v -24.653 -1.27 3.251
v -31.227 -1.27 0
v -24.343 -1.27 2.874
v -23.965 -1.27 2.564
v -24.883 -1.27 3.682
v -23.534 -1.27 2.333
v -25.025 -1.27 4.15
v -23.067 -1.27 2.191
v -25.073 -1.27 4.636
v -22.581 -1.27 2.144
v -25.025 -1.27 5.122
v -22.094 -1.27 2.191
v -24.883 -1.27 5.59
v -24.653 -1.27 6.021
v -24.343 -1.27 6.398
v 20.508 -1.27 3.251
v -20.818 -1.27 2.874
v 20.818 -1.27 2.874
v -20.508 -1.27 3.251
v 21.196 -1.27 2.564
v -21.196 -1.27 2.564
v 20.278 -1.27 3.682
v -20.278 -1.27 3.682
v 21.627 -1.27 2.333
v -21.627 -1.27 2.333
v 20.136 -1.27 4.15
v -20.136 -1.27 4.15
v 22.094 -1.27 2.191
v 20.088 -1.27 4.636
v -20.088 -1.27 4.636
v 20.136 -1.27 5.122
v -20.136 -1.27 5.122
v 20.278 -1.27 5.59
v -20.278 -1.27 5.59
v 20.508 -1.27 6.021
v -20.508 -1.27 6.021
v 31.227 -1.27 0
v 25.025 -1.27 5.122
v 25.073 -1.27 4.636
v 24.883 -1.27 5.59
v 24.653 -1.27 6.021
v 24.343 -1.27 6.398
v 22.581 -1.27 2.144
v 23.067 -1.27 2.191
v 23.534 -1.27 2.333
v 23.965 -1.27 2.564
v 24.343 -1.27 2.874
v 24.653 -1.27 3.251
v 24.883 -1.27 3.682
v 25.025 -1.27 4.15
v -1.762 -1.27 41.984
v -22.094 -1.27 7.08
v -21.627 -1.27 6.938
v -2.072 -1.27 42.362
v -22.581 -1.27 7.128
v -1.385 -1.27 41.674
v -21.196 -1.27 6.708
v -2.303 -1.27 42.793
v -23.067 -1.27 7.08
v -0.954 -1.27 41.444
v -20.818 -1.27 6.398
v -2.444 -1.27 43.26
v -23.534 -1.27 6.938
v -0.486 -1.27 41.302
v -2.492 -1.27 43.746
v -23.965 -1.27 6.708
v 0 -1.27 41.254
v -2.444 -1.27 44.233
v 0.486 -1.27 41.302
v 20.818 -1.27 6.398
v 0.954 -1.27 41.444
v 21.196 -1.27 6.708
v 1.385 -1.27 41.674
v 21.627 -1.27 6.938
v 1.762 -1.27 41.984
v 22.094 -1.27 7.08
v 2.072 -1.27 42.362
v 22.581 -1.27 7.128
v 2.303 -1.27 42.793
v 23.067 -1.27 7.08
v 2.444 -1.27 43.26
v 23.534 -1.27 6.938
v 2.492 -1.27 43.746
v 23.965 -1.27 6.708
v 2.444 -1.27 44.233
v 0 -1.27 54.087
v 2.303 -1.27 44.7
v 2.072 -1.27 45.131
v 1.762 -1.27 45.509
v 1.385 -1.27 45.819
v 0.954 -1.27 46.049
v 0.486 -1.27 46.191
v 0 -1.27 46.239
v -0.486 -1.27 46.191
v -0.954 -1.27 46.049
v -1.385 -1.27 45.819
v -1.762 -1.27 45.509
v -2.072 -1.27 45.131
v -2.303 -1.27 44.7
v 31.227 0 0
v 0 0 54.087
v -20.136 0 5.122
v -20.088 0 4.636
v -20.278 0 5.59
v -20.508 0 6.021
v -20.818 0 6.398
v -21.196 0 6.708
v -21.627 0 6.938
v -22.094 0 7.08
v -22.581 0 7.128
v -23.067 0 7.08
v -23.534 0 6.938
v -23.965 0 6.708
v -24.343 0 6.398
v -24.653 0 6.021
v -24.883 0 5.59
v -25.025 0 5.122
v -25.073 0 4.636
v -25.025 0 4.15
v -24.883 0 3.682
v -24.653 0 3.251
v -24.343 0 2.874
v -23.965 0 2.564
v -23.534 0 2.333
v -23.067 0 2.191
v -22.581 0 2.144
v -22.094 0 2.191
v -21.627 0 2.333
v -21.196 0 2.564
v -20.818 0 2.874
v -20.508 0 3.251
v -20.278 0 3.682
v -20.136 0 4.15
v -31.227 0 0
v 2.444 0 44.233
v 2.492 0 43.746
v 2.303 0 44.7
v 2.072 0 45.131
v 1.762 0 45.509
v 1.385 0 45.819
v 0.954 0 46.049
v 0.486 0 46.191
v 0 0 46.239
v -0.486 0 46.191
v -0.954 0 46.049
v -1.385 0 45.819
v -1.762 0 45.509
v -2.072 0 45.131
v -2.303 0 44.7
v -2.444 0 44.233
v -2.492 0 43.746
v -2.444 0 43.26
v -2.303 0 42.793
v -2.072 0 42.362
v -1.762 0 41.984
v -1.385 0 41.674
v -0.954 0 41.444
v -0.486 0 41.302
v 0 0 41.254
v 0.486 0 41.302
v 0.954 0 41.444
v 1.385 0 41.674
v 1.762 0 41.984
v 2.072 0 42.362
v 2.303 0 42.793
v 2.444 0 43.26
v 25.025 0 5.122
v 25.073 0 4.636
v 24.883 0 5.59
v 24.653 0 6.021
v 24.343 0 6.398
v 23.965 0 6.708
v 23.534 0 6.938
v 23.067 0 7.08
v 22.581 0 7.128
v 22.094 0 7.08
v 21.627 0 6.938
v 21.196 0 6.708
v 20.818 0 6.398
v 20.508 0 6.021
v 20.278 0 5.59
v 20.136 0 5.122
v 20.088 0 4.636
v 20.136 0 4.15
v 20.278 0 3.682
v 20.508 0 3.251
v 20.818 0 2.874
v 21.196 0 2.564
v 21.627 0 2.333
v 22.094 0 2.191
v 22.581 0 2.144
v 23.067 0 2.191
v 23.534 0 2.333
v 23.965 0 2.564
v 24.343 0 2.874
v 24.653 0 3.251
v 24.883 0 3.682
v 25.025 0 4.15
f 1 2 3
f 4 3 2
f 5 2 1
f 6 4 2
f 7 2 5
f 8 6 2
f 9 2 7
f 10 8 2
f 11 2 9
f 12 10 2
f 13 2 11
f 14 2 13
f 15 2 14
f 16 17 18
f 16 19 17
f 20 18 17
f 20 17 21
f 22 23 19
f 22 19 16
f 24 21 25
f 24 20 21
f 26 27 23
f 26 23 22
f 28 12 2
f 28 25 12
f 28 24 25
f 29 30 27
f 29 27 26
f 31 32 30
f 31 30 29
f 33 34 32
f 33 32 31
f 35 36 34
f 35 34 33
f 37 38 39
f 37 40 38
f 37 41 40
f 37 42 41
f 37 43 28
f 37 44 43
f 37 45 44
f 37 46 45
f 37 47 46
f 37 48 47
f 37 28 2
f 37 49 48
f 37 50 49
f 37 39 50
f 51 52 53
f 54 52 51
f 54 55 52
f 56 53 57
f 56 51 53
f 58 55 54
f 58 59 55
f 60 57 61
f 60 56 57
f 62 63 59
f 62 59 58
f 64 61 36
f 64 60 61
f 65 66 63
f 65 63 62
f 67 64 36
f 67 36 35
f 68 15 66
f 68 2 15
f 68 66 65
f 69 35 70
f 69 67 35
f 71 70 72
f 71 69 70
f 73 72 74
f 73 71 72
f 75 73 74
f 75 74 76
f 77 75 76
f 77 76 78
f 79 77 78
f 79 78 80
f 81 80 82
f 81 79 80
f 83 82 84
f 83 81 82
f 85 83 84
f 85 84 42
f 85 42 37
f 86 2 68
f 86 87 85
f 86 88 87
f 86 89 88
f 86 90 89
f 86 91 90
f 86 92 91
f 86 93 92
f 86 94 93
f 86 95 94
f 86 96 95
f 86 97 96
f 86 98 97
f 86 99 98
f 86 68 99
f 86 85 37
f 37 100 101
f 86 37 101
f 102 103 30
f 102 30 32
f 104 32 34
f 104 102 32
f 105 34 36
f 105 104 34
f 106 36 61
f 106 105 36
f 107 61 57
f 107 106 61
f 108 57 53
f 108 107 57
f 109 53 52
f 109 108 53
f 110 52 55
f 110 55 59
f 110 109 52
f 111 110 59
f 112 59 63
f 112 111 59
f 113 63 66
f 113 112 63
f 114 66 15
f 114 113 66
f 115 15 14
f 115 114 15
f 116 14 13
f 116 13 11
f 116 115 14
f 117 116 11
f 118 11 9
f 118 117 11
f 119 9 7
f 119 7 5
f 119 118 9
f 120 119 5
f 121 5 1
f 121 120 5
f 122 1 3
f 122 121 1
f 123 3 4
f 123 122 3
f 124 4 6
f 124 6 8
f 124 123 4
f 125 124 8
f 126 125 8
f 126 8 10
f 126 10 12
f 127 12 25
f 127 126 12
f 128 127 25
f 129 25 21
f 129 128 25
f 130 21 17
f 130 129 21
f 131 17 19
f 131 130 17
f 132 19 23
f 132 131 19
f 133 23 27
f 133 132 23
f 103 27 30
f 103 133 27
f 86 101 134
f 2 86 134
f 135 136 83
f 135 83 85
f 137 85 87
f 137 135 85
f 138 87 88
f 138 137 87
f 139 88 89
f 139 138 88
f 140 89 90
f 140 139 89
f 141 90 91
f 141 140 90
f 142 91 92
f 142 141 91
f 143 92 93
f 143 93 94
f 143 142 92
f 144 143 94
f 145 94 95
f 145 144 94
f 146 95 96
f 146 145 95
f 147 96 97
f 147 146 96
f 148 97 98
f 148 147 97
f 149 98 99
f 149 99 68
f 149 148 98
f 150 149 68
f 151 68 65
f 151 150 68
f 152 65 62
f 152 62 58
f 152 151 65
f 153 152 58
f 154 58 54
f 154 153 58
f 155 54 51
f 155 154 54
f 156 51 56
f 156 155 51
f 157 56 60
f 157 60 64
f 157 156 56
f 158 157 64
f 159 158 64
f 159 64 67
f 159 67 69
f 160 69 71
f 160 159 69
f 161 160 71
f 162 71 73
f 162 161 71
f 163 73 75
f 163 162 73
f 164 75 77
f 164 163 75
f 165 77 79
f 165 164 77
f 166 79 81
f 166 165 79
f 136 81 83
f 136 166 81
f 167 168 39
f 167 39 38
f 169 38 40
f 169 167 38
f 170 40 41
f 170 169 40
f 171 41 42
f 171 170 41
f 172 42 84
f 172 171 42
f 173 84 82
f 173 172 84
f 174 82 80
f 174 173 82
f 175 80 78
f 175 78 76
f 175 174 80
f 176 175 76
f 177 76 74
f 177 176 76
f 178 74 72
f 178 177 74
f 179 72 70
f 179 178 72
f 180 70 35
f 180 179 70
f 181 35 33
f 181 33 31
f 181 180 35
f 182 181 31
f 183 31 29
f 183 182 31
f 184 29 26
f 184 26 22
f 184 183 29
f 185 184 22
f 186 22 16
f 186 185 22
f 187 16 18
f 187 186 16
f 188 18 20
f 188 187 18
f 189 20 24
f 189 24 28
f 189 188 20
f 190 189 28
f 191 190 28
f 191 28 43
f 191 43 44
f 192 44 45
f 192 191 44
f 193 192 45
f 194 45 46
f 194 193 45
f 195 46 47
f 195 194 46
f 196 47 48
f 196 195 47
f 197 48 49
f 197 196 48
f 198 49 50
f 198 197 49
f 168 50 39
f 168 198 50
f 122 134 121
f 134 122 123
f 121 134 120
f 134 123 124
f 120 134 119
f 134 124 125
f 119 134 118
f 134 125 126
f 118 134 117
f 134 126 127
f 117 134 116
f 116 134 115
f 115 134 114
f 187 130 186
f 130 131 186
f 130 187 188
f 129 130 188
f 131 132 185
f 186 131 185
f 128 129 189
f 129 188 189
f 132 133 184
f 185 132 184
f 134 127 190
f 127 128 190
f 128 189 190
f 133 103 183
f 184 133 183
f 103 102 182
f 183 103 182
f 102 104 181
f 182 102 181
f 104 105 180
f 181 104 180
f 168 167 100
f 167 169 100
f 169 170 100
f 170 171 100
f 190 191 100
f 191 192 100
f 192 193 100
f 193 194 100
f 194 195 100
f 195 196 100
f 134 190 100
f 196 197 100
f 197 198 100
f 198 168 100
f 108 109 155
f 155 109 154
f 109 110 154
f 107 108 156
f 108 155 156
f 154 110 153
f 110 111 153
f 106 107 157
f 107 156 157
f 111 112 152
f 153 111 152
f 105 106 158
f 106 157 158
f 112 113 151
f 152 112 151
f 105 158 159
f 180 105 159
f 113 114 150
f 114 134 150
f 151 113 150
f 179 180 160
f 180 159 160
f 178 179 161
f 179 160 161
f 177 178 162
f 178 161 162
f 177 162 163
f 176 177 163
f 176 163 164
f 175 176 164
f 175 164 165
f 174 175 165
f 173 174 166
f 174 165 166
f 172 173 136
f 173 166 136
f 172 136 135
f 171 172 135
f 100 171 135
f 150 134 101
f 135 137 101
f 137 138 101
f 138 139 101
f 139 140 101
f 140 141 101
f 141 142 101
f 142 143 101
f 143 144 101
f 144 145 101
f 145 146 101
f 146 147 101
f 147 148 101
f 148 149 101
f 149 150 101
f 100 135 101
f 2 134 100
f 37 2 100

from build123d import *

# Parameters (mm, degrees)
F0_R     = 2.49232
F1_DEPTH = 1.27


with BuildPart() as f1:
    # F0 (on Front) → F1 (new body)
    with BuildSketch(Plane.XZ):
        Polygon((0, 54.086622), (-31.226926, 0), (31.226926, 0), align=None)
        with Locations((-22.580516, 4.635875)):
            Circle(F0_R, mode=Mode.SUBTRACT)
        with Locations((22.580516, 4.635875)):
            Circle(F0_R, mode=Mode.SUBTRACT)
        with Locations((0, 43.746475)):
            Circle(F0_R, mode=Mode.SUBTRACT)
    extrude(amount=F1_DEPTH)


solid = f1.part
